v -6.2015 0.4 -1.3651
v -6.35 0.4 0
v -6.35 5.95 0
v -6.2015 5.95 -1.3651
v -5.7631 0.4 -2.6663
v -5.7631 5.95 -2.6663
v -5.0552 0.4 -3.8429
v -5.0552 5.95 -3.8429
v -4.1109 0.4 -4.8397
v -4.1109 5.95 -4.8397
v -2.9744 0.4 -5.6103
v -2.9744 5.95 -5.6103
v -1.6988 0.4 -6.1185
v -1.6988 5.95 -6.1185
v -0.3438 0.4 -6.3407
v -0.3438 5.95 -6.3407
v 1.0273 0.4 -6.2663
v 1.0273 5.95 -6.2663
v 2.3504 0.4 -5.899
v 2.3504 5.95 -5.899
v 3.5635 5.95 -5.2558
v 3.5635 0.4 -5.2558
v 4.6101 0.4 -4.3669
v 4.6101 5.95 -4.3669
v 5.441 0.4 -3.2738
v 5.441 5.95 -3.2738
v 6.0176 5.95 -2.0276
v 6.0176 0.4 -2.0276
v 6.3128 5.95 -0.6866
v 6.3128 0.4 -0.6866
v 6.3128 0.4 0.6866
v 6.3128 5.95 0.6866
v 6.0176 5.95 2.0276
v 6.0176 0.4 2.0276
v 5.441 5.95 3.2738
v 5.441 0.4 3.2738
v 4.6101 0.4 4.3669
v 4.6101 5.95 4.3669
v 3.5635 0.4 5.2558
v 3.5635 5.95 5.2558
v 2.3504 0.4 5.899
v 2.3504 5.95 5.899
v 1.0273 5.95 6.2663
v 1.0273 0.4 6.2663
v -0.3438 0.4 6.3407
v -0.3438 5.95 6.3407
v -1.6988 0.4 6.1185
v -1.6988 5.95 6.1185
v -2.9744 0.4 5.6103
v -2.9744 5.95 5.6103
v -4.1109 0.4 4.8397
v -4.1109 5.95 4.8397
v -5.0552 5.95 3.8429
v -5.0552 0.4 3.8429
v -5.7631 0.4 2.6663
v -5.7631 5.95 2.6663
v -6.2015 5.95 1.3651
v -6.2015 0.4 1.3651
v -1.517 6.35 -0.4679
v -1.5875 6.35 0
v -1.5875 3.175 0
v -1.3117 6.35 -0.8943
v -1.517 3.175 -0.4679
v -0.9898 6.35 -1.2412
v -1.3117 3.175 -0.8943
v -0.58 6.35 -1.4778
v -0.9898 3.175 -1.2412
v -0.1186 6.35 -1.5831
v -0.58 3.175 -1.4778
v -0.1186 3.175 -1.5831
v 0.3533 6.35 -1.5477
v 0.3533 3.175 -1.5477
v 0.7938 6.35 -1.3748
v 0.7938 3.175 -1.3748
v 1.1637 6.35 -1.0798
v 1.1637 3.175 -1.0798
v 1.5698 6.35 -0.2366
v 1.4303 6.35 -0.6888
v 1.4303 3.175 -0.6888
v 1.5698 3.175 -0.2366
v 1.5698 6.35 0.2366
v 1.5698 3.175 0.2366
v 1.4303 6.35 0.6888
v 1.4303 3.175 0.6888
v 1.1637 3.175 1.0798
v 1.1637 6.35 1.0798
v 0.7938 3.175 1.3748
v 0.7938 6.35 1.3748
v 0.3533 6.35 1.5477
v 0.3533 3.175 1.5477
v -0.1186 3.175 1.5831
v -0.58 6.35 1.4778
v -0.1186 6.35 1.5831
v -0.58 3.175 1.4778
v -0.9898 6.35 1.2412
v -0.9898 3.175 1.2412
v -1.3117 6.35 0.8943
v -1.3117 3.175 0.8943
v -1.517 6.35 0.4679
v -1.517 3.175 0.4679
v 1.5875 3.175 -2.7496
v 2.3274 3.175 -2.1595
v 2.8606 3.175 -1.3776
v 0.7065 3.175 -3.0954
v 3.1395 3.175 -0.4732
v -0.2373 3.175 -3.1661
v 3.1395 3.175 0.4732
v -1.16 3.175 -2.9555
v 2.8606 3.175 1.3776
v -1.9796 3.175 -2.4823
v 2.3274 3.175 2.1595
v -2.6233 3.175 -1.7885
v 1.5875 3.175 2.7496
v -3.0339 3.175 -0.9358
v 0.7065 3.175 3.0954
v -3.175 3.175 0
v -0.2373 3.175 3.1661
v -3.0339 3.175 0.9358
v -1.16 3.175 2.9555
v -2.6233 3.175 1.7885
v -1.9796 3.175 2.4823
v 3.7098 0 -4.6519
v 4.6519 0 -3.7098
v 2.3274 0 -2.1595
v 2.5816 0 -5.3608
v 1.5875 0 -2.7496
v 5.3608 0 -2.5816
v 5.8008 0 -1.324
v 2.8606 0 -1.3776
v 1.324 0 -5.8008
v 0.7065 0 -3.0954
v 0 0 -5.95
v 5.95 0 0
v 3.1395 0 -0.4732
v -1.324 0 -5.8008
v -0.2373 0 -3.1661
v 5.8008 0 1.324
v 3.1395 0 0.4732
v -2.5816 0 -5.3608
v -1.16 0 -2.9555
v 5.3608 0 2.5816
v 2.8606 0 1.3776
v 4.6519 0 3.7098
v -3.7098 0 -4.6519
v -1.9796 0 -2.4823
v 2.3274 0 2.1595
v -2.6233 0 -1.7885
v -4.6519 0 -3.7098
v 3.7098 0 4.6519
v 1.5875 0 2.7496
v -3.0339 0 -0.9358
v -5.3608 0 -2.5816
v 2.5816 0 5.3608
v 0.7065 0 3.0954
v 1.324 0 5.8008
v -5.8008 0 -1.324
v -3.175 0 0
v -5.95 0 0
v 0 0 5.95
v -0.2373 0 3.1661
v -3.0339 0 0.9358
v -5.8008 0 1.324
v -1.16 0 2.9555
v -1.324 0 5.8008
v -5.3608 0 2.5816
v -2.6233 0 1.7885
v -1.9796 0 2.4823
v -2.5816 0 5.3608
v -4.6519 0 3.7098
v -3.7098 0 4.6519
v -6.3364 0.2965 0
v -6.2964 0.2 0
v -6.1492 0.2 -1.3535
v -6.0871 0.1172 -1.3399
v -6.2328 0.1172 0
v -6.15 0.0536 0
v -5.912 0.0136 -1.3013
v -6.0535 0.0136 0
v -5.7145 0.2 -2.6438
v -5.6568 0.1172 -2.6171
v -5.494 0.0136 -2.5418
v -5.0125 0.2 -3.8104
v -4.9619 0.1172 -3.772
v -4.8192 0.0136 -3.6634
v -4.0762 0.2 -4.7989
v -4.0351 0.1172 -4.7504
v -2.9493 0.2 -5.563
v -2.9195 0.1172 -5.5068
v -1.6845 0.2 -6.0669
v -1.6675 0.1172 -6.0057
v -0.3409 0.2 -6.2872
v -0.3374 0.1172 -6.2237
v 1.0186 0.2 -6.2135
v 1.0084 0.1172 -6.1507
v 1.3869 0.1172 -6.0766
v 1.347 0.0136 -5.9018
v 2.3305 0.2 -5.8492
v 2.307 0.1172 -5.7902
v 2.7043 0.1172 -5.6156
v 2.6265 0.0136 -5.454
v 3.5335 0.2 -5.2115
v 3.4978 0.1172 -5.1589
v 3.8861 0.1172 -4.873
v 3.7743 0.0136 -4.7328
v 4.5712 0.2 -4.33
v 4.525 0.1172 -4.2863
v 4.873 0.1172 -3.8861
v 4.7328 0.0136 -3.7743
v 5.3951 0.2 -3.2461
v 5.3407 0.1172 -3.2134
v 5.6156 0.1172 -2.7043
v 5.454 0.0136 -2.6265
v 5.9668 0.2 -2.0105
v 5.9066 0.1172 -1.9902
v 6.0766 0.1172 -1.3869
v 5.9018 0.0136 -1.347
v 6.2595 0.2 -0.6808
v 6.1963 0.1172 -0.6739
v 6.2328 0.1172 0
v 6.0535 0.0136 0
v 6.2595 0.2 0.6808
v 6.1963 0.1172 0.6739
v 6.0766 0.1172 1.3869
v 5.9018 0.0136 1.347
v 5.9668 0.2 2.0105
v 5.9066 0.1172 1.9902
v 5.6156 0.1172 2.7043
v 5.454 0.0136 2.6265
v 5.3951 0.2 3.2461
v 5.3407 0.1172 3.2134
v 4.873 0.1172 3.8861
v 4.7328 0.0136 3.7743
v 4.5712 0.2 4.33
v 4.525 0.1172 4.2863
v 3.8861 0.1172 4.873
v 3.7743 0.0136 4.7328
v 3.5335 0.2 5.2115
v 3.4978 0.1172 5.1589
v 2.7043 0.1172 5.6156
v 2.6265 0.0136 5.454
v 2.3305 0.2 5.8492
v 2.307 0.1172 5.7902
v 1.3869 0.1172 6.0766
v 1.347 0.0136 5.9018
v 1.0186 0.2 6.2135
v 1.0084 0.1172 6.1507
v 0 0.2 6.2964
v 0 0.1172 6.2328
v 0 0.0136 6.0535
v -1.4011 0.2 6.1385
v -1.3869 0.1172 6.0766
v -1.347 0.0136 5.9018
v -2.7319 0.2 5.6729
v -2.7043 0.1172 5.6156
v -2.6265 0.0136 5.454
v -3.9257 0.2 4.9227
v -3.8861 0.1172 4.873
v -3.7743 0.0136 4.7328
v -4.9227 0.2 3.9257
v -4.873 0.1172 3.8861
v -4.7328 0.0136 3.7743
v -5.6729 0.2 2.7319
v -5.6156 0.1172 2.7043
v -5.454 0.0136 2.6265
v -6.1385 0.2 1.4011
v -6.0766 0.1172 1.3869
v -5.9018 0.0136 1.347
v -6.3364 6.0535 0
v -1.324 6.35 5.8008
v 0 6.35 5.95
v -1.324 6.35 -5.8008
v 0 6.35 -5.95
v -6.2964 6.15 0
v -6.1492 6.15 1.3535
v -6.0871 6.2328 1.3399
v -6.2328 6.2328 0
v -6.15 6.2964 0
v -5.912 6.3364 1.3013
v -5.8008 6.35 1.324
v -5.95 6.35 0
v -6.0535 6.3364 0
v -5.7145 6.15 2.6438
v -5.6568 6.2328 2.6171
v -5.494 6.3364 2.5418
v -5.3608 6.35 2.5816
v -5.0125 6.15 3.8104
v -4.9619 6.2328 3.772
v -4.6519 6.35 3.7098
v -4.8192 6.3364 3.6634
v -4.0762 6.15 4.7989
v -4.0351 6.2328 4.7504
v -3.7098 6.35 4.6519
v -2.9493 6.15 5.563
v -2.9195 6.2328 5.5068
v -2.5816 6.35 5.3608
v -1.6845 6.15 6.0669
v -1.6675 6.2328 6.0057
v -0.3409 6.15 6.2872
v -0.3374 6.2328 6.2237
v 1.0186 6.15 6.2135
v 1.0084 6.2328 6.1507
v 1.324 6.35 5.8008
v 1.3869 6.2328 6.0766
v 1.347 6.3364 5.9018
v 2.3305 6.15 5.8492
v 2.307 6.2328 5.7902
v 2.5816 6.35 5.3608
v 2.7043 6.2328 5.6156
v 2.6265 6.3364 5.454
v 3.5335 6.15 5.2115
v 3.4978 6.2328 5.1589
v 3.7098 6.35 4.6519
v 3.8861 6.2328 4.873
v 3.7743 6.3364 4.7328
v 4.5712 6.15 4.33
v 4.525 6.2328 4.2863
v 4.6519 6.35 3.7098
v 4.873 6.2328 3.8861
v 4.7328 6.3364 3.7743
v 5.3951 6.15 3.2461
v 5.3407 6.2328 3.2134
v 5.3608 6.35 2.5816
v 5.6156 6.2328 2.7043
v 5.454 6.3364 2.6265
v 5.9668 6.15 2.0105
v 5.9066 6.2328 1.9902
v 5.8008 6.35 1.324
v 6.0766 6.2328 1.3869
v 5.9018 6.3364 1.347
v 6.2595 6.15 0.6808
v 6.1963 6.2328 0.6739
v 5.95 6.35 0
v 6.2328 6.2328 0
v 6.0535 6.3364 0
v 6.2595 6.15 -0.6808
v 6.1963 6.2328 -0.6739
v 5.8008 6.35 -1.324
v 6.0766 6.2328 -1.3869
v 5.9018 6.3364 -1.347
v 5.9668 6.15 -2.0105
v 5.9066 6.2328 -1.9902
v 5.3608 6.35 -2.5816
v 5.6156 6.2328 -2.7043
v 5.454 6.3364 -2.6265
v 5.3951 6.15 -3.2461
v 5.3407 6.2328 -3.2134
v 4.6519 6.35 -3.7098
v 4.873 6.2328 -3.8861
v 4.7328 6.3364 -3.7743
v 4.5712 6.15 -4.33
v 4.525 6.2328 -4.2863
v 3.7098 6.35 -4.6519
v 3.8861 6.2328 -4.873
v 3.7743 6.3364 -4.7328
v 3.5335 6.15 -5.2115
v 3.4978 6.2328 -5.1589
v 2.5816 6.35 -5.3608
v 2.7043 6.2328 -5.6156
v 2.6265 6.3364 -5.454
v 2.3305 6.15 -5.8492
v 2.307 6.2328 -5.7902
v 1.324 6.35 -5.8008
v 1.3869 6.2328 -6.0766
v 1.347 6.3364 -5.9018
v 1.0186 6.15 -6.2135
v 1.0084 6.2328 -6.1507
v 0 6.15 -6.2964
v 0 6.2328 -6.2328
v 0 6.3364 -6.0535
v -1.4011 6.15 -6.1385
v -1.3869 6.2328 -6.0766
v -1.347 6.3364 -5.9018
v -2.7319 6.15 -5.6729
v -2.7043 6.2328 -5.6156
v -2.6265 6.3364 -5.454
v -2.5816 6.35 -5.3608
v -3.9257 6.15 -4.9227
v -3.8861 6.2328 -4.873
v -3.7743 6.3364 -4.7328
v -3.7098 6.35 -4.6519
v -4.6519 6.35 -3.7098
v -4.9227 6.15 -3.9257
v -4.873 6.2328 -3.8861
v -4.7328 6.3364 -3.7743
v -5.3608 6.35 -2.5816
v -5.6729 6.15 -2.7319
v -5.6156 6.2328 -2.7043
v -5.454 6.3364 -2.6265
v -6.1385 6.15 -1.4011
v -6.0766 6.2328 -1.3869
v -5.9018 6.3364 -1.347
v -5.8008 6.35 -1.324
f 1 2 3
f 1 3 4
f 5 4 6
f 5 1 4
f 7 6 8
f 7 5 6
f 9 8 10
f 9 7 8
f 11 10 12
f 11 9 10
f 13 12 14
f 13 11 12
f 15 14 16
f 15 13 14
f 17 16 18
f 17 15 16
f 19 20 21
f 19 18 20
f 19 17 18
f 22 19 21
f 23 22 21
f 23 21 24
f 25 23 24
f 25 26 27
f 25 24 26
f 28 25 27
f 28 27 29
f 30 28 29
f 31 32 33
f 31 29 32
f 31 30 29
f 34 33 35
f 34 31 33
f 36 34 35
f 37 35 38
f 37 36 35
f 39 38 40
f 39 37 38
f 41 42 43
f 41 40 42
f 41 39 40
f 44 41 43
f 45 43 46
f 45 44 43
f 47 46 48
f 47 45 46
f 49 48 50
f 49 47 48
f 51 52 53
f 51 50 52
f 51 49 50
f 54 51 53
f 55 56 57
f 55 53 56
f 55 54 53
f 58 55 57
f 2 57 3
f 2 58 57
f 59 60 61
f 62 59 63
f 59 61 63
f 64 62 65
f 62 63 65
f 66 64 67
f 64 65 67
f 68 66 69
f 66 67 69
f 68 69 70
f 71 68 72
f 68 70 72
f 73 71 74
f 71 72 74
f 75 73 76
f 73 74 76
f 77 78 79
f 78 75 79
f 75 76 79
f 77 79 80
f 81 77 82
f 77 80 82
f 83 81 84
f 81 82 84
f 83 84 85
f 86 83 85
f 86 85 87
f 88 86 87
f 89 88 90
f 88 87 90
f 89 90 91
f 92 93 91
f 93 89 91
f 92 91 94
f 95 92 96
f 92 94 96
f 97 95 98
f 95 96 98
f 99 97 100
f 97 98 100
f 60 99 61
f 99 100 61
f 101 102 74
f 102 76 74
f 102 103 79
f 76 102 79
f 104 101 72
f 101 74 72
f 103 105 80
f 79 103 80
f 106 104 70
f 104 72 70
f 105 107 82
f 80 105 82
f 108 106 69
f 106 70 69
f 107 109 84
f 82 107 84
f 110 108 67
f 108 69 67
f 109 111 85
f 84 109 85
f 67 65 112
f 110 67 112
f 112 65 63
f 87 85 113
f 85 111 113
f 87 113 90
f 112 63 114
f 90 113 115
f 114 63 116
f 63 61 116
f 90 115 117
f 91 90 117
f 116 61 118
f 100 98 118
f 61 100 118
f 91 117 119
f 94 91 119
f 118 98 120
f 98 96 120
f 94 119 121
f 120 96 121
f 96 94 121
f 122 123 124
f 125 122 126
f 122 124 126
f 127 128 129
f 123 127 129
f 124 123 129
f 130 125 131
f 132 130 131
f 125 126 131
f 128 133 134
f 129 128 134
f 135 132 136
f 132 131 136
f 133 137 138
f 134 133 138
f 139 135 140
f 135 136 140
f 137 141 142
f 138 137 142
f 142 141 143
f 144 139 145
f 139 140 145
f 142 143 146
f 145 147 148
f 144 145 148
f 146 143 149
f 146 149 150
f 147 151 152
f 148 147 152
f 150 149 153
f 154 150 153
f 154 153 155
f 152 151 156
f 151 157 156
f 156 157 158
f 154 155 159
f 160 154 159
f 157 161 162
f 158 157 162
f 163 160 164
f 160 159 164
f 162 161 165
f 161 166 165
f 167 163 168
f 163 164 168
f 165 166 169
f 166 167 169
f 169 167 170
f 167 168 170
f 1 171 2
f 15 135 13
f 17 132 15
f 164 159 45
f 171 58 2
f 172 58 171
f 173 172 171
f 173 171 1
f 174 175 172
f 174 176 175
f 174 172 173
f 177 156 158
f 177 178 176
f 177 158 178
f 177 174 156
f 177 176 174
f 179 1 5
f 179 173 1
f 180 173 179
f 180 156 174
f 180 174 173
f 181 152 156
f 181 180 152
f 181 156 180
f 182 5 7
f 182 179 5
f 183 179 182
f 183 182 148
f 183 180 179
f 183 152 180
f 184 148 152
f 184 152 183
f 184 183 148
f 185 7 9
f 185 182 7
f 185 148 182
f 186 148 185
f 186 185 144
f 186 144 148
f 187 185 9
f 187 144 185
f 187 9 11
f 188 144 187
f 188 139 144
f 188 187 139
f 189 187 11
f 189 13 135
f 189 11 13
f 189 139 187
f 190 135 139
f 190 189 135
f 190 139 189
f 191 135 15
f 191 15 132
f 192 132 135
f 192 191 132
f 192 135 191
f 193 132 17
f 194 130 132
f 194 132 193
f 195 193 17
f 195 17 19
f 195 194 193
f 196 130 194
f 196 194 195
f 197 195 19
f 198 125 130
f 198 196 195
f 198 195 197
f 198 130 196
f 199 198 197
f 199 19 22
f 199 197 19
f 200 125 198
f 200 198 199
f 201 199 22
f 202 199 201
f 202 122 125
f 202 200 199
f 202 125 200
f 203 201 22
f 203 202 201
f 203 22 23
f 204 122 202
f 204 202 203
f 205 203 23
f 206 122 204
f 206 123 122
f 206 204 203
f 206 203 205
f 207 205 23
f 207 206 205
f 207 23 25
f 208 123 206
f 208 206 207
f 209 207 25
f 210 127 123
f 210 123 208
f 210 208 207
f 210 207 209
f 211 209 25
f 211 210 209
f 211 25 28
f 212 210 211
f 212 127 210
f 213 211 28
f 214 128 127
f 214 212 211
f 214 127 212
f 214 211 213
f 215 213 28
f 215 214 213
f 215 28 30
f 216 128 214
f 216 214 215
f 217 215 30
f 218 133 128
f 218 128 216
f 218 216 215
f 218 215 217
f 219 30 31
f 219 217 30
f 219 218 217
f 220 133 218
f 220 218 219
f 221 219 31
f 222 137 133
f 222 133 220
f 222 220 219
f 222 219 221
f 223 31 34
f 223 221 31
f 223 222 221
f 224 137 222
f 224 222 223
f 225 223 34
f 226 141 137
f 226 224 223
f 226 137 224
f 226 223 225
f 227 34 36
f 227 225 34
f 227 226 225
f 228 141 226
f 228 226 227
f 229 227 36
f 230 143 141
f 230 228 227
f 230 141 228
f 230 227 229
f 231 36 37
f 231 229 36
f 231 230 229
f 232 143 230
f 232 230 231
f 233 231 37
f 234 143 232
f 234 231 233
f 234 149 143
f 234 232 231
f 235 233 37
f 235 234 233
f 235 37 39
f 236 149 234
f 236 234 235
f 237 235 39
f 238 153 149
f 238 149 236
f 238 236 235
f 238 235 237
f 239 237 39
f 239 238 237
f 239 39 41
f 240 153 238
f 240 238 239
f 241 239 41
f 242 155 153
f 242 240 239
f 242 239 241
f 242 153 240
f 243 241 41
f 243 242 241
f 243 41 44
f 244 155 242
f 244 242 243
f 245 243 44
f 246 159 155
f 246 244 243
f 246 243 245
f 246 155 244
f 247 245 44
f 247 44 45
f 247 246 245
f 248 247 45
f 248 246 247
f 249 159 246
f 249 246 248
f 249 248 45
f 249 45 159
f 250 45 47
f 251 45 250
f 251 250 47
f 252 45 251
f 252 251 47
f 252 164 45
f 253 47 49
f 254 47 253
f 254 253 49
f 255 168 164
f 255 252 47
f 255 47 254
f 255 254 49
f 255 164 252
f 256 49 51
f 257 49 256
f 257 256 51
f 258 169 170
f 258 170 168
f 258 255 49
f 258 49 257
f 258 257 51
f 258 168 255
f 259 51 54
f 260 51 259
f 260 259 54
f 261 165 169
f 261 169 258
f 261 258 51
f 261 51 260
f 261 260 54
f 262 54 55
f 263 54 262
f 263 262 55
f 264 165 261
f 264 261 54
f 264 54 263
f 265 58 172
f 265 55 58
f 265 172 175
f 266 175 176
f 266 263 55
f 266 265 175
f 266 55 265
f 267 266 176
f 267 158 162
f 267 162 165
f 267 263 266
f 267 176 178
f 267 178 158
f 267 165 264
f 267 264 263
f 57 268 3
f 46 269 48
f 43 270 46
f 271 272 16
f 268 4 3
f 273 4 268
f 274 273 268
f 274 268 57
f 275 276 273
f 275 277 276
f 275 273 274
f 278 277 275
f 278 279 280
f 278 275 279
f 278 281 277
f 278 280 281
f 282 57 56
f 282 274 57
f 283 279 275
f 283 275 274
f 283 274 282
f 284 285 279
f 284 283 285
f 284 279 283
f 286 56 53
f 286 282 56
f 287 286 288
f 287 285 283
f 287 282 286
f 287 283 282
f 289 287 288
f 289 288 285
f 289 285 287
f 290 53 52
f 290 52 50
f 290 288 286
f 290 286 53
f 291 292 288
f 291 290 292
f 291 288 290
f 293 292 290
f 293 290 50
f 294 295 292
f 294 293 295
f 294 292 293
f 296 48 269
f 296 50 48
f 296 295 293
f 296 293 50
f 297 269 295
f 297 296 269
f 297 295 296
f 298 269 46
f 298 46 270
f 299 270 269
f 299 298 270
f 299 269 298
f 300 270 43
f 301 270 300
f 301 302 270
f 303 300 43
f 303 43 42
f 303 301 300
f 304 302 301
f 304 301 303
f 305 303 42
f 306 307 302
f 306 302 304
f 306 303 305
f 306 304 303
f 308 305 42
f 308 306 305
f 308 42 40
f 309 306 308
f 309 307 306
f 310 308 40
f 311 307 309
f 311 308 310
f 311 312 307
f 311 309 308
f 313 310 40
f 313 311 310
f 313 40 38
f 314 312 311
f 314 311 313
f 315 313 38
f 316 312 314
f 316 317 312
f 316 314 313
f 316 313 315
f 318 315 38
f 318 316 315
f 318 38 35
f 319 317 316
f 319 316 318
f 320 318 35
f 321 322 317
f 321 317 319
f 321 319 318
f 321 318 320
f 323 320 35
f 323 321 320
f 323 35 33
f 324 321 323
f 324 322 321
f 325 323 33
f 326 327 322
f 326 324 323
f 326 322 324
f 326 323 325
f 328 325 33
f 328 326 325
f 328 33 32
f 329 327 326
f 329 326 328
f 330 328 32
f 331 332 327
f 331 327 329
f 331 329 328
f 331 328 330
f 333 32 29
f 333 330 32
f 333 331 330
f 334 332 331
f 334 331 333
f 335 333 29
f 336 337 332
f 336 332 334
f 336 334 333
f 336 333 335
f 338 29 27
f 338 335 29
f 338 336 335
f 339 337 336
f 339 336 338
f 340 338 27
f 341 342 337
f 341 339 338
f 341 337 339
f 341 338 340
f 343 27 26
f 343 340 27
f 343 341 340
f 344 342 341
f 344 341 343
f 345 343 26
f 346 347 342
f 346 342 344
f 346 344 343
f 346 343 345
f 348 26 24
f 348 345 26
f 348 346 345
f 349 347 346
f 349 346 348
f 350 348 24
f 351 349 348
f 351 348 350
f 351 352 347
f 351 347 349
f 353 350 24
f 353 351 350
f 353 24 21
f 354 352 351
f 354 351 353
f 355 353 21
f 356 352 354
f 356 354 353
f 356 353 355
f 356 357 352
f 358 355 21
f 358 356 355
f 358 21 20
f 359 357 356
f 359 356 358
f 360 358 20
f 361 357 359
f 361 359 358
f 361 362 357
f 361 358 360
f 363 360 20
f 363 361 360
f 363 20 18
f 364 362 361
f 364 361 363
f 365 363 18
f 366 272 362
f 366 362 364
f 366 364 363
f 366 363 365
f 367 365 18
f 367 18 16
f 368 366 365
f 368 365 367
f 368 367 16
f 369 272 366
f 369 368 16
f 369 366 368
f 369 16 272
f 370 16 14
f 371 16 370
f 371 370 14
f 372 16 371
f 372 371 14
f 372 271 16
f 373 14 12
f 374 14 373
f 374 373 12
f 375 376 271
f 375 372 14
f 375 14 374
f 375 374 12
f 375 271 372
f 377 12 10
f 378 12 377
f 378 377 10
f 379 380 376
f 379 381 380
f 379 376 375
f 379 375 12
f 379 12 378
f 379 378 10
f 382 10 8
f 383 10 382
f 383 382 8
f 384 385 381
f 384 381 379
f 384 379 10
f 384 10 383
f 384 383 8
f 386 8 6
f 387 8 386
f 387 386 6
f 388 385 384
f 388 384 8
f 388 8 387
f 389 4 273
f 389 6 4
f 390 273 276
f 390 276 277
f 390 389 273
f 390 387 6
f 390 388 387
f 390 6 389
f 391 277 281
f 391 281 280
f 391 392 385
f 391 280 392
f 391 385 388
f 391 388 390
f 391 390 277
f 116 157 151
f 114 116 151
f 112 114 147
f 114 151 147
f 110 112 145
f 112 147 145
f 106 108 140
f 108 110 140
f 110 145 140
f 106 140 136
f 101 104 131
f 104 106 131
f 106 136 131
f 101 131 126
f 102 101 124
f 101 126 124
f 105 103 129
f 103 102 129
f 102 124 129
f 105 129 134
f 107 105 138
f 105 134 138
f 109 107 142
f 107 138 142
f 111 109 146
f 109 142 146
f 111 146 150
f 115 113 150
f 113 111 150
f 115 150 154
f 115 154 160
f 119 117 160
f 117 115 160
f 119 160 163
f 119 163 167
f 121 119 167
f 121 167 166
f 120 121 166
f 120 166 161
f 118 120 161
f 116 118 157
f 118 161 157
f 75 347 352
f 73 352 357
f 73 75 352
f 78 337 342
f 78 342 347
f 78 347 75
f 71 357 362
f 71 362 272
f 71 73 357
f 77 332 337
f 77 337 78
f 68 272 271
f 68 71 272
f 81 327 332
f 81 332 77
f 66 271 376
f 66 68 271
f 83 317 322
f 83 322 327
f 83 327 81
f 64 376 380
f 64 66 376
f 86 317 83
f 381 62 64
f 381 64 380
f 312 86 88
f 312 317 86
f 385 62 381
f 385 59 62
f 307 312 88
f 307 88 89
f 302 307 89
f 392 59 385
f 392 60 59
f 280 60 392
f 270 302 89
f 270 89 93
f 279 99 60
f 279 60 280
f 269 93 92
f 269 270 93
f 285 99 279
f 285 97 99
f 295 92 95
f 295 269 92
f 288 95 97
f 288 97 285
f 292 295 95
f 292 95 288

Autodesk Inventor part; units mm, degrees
ref_plane "YZ Plane" through (0, 0, 0) normal (1, 0, 0) x (0, 1, 0)
ref_plane "XZ Plane" through (0, 0, 0) normal (0, 1, 0) x (-1, 0, 0)
ref_plane "XY Plane" through (0, 0, 0) normal (0, 0, 1) x (1, 0, 0)
sketch "Sketch1" plane through (0, 0, 0) normal (0, 1, 0) x (-1, 0, 0)
  circle A0 centre (0, 0) radius 6.35
  circle A1 centre (0, 0) radius 1.5875
  circle A2 centre (0, 0) radius 3.175
  dimension "d0" = 12.7
  dimension "d1" = 3.175
  dimension "d4" = 6.35
extrude "Extrusion1" add sketch "Sketch1" along normal blind 6.35 contours A0 | A2
extrude "Extrusion2" cut sketch "Sketch1" along normal blind 3.175 contours A1 | A2
fillet "Fillet1" radius 0.4 2 edges at (6.35, 6.35, 0) (6.35, 0, 0)
properties part number "Bumper"
